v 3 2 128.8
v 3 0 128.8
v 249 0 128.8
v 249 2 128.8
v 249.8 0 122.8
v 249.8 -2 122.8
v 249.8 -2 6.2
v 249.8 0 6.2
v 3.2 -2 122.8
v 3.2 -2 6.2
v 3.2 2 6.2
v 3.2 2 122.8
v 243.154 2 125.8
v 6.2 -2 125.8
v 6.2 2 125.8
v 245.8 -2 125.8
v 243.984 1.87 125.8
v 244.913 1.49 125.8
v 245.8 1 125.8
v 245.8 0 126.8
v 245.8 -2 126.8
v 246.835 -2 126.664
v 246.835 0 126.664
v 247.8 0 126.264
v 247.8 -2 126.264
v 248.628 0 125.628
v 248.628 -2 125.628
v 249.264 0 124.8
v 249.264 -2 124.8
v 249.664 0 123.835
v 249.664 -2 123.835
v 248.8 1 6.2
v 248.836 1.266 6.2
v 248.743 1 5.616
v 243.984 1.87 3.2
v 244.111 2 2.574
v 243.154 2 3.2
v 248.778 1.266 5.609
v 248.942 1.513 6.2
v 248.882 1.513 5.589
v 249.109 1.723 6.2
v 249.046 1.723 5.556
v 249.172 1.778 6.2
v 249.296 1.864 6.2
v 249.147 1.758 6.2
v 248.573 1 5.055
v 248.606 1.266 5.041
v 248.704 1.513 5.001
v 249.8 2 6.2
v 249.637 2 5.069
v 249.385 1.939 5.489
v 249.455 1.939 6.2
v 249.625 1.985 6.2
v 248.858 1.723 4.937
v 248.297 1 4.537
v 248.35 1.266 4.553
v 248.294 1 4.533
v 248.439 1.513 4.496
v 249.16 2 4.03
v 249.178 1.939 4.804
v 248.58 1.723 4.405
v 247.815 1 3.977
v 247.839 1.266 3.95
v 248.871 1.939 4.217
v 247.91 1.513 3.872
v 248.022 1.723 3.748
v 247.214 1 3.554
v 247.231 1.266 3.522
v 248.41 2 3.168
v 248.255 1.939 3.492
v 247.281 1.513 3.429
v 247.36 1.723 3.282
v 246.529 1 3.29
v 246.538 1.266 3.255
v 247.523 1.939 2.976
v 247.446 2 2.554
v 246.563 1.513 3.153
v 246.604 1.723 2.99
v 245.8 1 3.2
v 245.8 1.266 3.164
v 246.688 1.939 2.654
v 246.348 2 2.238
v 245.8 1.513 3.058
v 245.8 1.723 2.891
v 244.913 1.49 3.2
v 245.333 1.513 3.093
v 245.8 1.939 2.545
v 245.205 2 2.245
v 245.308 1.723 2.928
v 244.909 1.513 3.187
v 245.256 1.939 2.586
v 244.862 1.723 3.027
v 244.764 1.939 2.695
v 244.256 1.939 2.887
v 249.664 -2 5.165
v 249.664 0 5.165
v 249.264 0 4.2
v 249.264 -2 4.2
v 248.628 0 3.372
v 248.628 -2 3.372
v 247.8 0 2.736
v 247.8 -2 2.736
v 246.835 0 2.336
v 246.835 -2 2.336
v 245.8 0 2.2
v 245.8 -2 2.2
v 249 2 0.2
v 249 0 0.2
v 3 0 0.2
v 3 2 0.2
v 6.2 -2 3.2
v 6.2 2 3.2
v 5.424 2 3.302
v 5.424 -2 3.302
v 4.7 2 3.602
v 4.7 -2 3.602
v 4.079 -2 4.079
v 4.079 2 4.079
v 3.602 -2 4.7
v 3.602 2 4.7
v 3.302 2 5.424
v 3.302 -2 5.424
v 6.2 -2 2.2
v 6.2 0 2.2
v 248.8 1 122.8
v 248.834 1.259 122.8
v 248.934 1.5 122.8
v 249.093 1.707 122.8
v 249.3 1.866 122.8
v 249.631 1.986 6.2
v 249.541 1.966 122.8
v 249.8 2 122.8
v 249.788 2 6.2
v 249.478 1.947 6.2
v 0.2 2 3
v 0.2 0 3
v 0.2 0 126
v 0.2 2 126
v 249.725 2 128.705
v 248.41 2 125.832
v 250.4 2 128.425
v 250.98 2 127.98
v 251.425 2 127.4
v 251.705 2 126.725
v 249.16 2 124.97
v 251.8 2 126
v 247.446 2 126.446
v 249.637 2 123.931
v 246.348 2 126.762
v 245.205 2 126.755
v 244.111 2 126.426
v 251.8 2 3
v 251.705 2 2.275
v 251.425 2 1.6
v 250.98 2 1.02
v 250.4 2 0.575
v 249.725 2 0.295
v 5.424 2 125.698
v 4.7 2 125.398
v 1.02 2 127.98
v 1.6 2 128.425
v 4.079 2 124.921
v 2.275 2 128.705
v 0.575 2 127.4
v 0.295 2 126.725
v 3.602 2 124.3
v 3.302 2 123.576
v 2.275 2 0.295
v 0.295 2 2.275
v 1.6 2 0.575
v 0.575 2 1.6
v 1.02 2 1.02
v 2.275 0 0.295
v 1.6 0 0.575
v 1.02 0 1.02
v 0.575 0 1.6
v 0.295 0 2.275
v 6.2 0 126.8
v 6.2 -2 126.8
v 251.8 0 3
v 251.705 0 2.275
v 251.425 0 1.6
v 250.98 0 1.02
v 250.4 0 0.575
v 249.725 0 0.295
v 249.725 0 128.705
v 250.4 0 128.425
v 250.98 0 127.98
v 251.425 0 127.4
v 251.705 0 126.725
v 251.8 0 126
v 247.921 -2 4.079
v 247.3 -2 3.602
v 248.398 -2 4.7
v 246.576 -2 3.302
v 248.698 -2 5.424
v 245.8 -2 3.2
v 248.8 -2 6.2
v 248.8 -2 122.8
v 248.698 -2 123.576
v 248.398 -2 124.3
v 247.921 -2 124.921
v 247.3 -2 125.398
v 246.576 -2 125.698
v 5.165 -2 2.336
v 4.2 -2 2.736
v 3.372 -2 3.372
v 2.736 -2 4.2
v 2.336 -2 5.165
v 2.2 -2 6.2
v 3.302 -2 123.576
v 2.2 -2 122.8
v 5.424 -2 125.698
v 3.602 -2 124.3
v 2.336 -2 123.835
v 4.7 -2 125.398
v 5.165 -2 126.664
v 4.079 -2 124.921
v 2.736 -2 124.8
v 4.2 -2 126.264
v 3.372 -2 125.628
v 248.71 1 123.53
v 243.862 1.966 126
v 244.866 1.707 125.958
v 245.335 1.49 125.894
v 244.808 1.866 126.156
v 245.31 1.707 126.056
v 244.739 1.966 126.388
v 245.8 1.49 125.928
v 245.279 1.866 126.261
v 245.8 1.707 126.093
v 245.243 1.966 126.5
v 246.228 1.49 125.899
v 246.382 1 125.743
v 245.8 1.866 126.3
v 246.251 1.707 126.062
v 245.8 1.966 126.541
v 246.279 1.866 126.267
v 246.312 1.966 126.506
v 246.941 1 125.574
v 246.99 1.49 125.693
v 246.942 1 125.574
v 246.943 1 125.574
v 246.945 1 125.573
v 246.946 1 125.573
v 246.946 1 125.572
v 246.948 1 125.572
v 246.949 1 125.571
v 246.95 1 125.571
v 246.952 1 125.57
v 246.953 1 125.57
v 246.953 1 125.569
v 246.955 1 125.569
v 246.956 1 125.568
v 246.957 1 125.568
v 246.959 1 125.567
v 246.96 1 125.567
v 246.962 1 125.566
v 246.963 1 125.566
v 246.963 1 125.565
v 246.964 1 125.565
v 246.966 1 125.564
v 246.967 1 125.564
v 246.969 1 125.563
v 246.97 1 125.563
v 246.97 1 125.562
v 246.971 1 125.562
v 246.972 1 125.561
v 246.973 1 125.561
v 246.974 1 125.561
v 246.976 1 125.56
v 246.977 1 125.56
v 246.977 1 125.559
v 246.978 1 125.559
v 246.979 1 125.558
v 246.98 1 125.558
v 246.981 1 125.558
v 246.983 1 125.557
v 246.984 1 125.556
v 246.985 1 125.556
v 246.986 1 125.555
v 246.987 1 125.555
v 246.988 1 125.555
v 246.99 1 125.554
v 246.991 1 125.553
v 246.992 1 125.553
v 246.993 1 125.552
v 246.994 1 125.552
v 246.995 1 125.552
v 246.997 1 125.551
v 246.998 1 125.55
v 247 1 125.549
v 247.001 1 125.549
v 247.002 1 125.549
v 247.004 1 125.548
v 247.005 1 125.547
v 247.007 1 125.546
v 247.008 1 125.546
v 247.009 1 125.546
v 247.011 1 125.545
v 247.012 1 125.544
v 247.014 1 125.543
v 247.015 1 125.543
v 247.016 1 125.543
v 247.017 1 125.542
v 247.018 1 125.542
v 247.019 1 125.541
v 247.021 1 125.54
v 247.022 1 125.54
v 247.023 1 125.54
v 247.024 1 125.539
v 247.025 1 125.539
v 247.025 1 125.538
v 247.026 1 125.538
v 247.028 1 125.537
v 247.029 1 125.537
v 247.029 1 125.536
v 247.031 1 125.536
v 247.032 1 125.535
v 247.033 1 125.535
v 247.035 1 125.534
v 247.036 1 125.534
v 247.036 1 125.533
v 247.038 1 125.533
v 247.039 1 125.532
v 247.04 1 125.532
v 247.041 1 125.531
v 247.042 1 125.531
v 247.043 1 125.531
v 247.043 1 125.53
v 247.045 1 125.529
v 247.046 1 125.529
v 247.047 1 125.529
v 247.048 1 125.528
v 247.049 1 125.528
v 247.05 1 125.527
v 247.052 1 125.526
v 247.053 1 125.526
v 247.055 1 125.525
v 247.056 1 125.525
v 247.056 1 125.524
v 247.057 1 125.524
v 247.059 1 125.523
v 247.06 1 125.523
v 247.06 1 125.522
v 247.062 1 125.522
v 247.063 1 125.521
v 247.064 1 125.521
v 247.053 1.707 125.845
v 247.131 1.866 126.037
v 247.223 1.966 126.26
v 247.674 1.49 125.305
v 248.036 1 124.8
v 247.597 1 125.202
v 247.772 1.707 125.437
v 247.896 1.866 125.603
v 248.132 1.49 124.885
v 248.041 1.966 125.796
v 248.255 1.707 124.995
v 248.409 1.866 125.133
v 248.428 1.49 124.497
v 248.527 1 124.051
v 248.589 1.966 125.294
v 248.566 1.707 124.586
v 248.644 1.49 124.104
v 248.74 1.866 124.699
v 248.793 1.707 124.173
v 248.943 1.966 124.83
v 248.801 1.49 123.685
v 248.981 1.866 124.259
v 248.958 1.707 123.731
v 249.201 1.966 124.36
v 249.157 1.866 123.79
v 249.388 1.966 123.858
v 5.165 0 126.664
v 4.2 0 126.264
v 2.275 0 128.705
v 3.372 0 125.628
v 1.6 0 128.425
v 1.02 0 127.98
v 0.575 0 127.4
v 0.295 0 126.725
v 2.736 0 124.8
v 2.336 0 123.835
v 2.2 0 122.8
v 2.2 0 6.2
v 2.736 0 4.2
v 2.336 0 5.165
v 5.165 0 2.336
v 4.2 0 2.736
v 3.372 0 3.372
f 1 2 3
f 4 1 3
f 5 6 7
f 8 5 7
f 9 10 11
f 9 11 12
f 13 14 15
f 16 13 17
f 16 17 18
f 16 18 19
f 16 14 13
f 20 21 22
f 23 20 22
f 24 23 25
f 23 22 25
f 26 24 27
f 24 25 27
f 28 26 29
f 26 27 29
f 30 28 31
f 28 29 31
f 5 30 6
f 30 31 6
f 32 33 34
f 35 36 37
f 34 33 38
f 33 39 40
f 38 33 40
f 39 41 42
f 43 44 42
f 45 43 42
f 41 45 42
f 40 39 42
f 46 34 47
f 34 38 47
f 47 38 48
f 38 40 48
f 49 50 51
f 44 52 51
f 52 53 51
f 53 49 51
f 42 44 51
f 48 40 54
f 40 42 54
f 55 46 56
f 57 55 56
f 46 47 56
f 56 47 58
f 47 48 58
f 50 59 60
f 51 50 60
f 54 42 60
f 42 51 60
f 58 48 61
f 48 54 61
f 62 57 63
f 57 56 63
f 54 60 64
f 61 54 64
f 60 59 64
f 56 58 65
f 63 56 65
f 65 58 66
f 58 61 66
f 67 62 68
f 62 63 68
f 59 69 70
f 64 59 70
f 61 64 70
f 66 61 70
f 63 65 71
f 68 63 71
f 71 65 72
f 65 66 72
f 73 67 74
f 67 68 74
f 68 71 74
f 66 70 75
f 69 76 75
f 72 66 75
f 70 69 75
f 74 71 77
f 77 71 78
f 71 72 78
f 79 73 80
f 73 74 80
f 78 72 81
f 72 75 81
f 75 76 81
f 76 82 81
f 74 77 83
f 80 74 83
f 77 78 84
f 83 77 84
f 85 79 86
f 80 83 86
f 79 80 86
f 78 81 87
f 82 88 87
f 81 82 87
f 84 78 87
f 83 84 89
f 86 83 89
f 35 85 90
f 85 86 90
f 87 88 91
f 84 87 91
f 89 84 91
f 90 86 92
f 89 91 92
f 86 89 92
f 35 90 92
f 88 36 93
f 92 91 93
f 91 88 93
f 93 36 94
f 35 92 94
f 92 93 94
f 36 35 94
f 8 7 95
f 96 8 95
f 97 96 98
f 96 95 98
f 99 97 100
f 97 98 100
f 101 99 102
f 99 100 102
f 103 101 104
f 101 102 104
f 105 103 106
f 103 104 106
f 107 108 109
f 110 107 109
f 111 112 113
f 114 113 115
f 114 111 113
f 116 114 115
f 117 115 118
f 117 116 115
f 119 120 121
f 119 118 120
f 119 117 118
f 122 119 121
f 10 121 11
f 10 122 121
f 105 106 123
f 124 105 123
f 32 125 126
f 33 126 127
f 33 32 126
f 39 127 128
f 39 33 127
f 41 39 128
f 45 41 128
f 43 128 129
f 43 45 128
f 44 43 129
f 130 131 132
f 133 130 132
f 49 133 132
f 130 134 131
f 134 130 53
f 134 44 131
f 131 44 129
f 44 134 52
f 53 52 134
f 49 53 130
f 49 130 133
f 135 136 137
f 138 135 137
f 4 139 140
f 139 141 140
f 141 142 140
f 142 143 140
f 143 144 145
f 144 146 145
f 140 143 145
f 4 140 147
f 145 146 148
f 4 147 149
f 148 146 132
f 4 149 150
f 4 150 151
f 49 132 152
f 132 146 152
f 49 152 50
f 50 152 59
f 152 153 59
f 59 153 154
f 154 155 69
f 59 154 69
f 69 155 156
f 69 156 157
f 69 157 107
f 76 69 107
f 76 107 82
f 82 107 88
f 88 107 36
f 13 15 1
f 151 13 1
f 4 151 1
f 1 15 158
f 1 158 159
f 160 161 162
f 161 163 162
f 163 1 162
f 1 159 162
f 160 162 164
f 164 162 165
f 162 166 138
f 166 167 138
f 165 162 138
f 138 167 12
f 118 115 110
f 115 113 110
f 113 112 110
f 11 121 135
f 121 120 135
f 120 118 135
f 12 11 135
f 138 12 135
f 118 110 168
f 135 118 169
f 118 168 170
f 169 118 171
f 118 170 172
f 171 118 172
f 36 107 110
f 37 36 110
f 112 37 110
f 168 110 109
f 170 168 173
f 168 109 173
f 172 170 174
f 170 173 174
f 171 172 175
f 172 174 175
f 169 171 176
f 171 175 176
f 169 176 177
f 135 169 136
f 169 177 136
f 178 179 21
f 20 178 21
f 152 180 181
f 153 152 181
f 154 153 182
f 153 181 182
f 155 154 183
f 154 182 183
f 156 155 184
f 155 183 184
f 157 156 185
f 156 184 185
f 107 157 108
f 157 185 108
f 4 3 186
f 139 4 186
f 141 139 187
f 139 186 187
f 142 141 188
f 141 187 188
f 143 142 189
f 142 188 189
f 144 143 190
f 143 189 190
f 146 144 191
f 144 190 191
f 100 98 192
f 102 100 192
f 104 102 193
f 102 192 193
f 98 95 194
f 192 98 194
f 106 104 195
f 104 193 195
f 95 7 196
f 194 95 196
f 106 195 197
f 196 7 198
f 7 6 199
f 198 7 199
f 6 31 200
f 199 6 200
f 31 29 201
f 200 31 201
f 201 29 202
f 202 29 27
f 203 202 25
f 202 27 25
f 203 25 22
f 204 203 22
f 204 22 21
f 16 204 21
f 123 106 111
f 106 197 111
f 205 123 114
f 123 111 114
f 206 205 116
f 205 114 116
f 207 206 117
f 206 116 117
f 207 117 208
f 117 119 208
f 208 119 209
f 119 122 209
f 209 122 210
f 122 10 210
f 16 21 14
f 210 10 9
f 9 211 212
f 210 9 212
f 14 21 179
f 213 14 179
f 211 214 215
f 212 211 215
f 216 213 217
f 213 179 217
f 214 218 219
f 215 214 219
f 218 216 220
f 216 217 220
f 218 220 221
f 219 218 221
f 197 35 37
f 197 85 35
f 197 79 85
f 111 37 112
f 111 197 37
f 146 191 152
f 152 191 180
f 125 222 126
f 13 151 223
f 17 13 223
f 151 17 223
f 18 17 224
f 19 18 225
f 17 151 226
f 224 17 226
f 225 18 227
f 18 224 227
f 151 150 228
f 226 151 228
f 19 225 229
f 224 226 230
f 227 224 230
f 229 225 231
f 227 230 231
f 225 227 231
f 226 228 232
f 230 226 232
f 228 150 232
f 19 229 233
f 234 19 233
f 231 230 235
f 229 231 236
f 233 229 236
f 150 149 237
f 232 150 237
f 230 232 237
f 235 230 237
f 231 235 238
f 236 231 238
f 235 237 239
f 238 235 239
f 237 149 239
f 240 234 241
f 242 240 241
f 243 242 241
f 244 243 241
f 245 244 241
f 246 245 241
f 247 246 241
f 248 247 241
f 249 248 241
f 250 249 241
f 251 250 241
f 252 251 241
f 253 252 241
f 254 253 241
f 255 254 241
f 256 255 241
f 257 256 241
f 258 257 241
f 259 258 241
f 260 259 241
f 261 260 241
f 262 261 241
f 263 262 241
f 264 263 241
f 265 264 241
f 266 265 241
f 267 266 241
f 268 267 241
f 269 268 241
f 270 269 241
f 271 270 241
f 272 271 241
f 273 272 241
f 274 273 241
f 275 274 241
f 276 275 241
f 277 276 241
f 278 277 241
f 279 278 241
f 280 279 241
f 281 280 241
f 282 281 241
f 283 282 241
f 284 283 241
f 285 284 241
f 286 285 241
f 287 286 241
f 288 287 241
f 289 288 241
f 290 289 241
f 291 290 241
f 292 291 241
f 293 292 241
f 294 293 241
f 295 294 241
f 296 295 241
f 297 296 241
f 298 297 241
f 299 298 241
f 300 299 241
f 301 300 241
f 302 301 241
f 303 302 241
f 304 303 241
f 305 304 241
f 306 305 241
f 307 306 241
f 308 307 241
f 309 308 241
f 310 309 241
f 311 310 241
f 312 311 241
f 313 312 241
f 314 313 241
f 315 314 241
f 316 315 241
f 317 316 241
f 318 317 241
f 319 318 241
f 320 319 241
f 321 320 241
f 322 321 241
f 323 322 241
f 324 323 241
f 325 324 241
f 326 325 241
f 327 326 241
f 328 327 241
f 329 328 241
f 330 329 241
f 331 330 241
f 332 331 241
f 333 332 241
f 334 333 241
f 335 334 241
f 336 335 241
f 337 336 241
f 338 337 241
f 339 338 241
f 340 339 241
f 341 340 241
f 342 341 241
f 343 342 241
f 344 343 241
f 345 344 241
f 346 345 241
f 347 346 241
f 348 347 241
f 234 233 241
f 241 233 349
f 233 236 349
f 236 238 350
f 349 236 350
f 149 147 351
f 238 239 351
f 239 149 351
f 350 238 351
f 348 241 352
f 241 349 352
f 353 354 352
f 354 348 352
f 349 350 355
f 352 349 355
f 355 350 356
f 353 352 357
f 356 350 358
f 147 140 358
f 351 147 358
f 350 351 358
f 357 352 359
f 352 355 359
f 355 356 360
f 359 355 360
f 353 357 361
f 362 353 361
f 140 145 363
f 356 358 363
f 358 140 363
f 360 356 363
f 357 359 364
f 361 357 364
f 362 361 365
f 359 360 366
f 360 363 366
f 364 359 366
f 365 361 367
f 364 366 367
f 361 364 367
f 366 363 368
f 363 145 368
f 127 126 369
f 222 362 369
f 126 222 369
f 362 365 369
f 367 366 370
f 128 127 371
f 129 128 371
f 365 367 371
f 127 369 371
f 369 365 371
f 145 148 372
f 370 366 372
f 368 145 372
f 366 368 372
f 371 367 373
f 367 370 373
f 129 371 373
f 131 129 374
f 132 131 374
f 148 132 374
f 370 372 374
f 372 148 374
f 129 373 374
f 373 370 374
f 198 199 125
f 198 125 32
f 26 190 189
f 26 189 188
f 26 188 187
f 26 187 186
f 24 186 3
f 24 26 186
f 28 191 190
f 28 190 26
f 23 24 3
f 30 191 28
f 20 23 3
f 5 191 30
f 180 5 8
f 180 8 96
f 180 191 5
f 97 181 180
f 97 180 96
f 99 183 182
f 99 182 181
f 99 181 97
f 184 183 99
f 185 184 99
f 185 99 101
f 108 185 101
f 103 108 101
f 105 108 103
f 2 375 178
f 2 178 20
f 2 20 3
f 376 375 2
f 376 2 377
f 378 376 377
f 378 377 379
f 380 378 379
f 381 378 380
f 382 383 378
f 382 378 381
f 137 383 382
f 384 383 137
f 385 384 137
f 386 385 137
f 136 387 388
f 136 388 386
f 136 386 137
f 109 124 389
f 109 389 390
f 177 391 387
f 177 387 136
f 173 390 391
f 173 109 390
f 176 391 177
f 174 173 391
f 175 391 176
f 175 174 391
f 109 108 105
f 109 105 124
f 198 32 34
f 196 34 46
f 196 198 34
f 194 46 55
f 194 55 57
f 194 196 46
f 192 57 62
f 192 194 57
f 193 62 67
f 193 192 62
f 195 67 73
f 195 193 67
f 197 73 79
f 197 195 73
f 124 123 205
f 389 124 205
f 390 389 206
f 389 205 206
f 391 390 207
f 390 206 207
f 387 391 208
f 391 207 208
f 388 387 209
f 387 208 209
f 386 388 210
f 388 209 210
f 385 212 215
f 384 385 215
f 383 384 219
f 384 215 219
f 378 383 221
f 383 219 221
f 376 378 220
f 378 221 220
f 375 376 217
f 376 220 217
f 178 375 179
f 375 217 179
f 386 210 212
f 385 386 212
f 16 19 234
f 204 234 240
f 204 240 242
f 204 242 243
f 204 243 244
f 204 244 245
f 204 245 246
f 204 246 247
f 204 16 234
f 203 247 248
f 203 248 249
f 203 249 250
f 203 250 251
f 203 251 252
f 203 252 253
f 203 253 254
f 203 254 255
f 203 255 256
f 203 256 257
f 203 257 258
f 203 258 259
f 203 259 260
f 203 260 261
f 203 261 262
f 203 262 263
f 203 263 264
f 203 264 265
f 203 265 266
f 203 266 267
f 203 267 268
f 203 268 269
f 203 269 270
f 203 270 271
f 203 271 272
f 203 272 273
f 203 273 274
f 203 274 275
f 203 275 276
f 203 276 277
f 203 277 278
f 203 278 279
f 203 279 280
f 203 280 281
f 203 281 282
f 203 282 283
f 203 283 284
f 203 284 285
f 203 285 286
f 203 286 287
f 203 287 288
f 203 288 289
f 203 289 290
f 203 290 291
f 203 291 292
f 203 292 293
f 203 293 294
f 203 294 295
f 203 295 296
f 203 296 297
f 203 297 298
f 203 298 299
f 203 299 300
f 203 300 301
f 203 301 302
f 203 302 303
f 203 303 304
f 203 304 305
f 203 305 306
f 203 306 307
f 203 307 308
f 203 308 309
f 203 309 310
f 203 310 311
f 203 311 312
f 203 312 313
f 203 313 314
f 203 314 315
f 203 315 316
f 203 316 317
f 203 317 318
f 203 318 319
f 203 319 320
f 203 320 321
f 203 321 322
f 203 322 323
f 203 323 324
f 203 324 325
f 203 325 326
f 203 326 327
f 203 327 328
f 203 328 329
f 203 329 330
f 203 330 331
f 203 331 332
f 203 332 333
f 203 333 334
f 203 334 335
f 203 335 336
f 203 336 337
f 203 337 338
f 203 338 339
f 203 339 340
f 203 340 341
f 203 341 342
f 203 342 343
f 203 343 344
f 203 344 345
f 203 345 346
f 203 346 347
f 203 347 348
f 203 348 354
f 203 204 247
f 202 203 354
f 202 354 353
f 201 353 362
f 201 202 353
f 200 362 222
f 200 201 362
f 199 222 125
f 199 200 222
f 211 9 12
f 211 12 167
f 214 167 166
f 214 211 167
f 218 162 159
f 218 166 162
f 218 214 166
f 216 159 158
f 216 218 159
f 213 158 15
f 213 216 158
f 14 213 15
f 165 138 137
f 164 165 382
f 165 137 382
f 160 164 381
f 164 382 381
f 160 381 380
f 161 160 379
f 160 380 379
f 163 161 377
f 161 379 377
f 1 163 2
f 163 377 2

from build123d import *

# Parameters (mm, degrees)
AUFSATZ_LINEAR_AUSTRAGEN1_DEPTH = 2
AUFSATZ_LINEAR_START            = 2
AUFSATZ_LINEAR_AUSTRAGEN2_DEPTH = 2
SCHNITT_LINEAR_START            = -34
SCHNITT_LINEAR_AUSTRAGEN1_DEPTH = 34
VERRUNDUNG2_START               = 6.1999999
VERRUNDUNG2_3_DEPTH             = 116.6000001


with BuildPart() as part:
    # Skizze1 → Aufsatz-Linear austragen1 (new body)
    with BuildSketch(Plane(origin=(0, 0, 0), x_dir=(1, 0, 0), z_dir=(0, 1, 0))):
        with BuildLine():
            Line((3, 0), (249, 0))
            ThreePointArc((249, 0), (251.121320344, -0.878679656), (252, -3))
            Line((252, -3), (252, -126))
            ThreePointArc((252, -126), (251.121320344, -128.121320344), (249, -129))
            Line((249, -129), (3, -129))
            ThreePointArc((3, -129), (0.878679656, -128.121320344), (0, -126))
            Line((0, -126), (0, -3))
            ThreePointArc((0, -3), (0.878679656, -0.878679656), (3, 0))
        make_face()
        with BuildLine():
            Line((6.2, -3.2), (245.8, -3.2))
            ThreePointArc((245.8, -3.2), (247.921320344, -4.078679656), (248.8, -6.2))
            Line((248.8, -6.2), (248.8, -122.8))
            ThreePointArc((248.8, -122.8), (247.921320344, -124.921320344), (245.8, -125.8))
            Line((245.8, -125.8), (6.2, -125.8))
            ThreePointArc((6.2, -125.8), (4.078679656, -124.921320344), (3.2, -122.8))
            Line((3.2, -122.8), (3.2, -6.2))
            ThreePointArc((3.2, -6.2), (4.078679656, -4.078679656), (6.2, -3.2))
        make_face(mode=Mode.SUBTRACT)
    extrude(amount=AUFSATZ_LINEAR_AUSTRAGEN1_DEPTH)

    # Skizze2 → Aufsatz-Linear austragen2 (add)
    with BuildSketch(Plane.XZ.offset(AUFSATZ_LINEAR_START)):
        with BuildLine():
            Line((6.2, 126.8), (245.8, 126.8))
            ThreePointArc((245.8, 126.8), (248.628427125, 125.628427125), (249.8, 122.8))
            Line((249.8, 122.8), (249.8, 6.2))
            ThreePointArc((249.8, 6.2), (248.628427125, 3.371572875), (245.8, 2.2))
            Line((245.8, 2.2), (6.2, 2.2))
            ThreePointArc((6.2, 2.2), (3.371572875, 3.371572875), (2.2, 6.2))
            Line((2.2, 6.2), (2.2, 122.8))
            ThreePointArc((2.2, 122.8), (3.371572875, 125.628427125), (6.2, 126.8))
        make_face()
        with BuildLine():
            Line((248.8, 122.8), (248.8, 6.2))
            ThreePointArc((248.8, 6.2), (247.921320344, 4.078679656), (245.8, 3.2))
            Line((245.8, 3.2), (6.2, 3.2))
            ThreePointArc((6.2, 3.2), (4.078679656, 4.078679656), (3.2, 6.2))
            Line((3.2, 6.2), (3.2, 122.8))
            ThreePointArc((3.2, 122.8), (4.078679656, 124.921320344), (6.2, 125.8))
            Line((6.2, 125.8), (245.8, 125.8))
            ThreePointArc((245.8, 125.8), (247.921320344, 124.921320344), (248.8, 122.8))
        make_face(mode=Mode.SUBTRACT)
    extrude(amount=-AUFSATZ_LINEAR_AUSTRAGEN2_DEPTH)

    # Skizze3 → Schnitt-Linear austragen1 (cut)
    with BuildSketch(Plane(origin=(0, 2, 0), x_dir=(1, 0, 0), z_dir=(0, 1, 0)).offset(SCHNITT_LINEAR_START)):
        with BuildLine():
            Line((249, 0), (3, 0))
            ThreePointArc((3, 0), (0.878679656, -0.878679656), (0, -3))
            Line((0, -3), (0, -126))
            ThreePointArc((0, -126), (0.878679656, -128.121320344), (3, -129))
            Line((3, -129), (249, -129))
            ThreePointArc((249, -129), (251.121320344, -128.121320344), (252, -126))
            Line((252, -126), (252, -3))
            ThreePointArc((252, -3), (251.121320344, -0.878679656), (249, 0))
        make_face()
        with BuildLine():
            Line((249, -0.2), (3, -0.2))
            ThreePointArc((3, -0.2), (1.020101013, -1.020101013), (0.2, -3))
            Line((0.2, -3), (0.2, -126))
            ThreePointArc((0.2, -126), (1.020101013, -127.979898987), (3, -128.8))
            Line((3, -128.8), (249, -128.8))
            ThreePointArc((249, -128.8), (250.979898987, -127.979898987), (251.8, -126))
            Line((251.8, -126), (251.8, -3))
            ThreePointArc((251.8, -3), (250.979898987, -1.020101013), (249, -0.2))
        make_face(mode=Mode.SUBTRACT)
    extrude(amount=SCHNITT_LINEAR_AUSTRAGEN1_DEPTH, mode=Mode.SUBTRACT)

    # Verrundung2: read off the stored shape, not the designer's step
    # Verrundung2 outline → Verrundung2 (revolve, cut)
    with BuildSketch(Plane(origin=(245.8, 0, 122.8), x_dir=(1, 0, 0), z_dir=(0, 0, 1))):
        with BuildLine():
            Line((3, 2), (3, 1))
            ThreePointArc((3, 1), (3.292893219, 1.707106781), (4, 2))
            Line((4, 2), (3, 2))
        make_face()
    revolve(axis=Axis((245.8, 0, 122.8), (0, 1, 0)), mode=Mode.SUBTRACT)

    # Verrundung2 2 outline → Verrundung2 2 (revolve, cut)
    with BuildSketch(Plane(origin=(245.8, 0, 6.2), x_dir=(1, 0, 0), z_dir=(0, 0, 1))):
        with BuildLine():
            Line((3, 2), (3, 1))
            ThreePointArc((3, 1), (3.292893219, 1.707106781), (4, 2))
            Line((4, 2), (3, 2))
        make_face()
    revolve(axis=Axis((245.8, 0, 6.2), (0, 1, 0)), mode=Mode.SUBTRACT)

    # Verrundung2 3 outline → Verrundung2 3 (cut)
    with BuildSketch(Plane.XY.offset(VERRUNDUNG2_START)):
        with BuildLine():
            ThreePointArc((248.8, 1), (249.092893219, 1.707106781), (249.8, 2))
            Line((249.8, 2), (248.8, 2))
            Line((248.8, 2), (248.8, 1))
        make_face()
    extrude(amount=VERRUNDUNG2_3_DEPTH, mode=Mode.SUBTRACT)


solid = part.part
